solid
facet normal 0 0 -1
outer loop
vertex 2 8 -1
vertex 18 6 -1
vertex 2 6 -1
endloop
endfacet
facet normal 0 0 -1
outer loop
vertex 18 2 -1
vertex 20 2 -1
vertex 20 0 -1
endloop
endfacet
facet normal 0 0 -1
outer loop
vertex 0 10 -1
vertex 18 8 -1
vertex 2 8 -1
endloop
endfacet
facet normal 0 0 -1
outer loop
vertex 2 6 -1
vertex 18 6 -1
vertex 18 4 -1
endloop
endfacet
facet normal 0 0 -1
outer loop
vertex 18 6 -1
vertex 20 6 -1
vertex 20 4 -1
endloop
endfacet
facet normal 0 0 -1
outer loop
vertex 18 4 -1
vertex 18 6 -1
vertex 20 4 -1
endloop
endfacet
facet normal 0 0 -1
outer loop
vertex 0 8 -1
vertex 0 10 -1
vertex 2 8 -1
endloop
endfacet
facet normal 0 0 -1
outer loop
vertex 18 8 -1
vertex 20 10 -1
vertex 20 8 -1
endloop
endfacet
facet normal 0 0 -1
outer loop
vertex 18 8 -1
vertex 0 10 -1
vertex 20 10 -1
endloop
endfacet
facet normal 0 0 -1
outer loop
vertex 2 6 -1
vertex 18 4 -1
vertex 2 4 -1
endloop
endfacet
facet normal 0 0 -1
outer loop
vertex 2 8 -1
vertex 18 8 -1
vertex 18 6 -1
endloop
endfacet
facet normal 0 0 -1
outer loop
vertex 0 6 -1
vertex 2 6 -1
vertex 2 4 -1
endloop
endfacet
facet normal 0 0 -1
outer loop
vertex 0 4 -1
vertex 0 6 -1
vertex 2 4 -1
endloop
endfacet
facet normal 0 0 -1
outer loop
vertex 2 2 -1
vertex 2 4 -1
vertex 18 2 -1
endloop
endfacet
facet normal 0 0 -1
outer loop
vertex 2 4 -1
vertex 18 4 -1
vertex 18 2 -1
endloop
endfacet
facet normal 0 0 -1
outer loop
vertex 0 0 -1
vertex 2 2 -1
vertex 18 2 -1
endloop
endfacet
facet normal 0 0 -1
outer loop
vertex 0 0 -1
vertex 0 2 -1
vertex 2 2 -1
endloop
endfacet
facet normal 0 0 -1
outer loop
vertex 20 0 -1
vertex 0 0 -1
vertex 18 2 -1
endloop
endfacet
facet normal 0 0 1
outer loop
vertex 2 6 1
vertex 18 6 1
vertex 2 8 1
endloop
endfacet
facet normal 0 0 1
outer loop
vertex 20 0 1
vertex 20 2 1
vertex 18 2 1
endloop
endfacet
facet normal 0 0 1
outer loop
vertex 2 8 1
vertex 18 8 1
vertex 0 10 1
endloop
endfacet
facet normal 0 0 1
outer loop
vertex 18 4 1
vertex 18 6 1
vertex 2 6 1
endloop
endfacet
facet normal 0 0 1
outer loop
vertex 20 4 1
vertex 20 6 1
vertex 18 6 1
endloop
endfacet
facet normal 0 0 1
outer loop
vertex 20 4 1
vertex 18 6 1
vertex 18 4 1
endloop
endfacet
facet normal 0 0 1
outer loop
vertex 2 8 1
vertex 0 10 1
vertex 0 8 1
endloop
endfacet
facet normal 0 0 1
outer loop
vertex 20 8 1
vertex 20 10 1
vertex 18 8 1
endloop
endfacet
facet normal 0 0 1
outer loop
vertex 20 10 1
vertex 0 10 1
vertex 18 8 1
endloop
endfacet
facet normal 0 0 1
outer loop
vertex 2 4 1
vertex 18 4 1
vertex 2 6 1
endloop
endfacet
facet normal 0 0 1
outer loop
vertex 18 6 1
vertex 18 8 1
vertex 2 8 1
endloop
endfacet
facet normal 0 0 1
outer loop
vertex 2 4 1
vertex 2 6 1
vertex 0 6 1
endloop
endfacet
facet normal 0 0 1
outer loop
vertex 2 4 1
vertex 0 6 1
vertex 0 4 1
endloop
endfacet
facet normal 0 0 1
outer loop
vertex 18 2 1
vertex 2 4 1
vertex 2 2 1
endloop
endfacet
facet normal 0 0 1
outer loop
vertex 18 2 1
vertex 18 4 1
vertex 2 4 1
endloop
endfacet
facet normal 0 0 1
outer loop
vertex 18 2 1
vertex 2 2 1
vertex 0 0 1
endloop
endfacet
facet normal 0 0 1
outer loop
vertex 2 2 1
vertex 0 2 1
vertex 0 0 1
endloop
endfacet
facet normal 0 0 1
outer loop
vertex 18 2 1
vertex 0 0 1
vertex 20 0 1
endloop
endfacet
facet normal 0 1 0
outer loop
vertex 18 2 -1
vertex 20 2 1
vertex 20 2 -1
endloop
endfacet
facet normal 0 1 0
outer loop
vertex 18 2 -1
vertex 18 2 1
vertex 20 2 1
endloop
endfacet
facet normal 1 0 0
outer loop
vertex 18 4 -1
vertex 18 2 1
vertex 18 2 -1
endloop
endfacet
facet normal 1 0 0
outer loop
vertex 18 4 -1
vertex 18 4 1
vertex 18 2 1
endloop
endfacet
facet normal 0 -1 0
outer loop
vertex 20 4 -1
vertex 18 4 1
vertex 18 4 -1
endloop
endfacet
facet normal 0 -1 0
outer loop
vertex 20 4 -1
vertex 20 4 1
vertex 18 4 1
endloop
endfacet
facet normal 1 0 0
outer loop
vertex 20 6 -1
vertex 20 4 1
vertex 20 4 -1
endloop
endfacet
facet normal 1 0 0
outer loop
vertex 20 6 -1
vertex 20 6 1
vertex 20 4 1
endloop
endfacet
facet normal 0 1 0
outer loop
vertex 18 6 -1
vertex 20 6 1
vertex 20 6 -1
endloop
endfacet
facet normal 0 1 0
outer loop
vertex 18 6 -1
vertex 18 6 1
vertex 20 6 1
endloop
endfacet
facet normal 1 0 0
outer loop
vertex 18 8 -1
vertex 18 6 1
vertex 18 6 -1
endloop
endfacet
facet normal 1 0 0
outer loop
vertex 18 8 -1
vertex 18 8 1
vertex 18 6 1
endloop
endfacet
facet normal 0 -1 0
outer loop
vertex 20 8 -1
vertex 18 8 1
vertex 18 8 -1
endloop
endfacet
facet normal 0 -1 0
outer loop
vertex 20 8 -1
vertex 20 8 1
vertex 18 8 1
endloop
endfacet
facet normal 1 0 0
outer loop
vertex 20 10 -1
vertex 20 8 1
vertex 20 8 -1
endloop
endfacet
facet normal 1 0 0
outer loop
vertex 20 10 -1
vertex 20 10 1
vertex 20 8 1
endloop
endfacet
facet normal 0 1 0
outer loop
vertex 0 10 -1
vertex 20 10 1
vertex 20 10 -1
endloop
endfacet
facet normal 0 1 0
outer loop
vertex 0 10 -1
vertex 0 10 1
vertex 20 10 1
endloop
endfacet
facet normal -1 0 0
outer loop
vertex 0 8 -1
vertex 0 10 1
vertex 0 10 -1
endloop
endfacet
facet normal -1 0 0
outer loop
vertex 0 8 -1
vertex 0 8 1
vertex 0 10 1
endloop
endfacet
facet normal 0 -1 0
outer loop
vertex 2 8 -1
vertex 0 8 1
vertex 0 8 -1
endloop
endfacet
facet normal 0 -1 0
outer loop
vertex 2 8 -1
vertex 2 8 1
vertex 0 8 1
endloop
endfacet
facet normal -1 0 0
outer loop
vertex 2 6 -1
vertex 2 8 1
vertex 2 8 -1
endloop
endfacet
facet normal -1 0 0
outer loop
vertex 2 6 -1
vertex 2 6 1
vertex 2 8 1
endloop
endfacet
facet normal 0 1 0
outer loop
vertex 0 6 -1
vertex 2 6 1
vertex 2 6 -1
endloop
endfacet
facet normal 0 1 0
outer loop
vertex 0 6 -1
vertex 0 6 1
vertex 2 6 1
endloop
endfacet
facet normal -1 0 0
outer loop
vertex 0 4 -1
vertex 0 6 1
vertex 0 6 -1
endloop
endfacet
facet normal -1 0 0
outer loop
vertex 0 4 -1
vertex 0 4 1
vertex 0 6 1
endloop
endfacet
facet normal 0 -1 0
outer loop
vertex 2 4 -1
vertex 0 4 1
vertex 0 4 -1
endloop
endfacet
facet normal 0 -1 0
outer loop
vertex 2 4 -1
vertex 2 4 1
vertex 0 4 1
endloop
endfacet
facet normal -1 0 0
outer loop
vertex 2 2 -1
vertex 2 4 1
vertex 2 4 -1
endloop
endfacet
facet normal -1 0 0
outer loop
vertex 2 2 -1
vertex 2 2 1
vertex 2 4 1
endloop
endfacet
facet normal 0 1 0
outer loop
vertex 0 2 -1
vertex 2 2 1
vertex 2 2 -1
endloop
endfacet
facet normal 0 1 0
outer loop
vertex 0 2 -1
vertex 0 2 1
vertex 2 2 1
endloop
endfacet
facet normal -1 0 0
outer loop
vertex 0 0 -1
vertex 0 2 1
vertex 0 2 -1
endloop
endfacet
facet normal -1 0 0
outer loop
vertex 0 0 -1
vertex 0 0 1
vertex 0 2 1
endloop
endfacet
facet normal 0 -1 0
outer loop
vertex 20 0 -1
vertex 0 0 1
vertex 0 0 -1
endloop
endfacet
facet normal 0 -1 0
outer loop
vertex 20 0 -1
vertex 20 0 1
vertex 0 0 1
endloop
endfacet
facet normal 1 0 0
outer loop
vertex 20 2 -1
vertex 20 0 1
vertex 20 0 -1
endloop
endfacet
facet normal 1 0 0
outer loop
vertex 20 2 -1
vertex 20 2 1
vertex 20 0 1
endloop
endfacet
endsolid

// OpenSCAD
linear_extrude(height = 2, center = true, convexity = 10, twist = 0)
polygon([[0,0],[20,0],[20,2],[18,2],[18,4],[20,4],[20,6],[18,6],[18,8],[20,8],[20,10],[0,10],[0,8],[2,8],[2,6],[0,6],[0,4],[2,4],[2,2],[0,2]],[[0,1,2,3,4,5,6,7,8,9,10,11,12,13,14,15,16,17,18,19]]);


Wood_size = 20; // [10:Small,20:Medium,30:Large]

Wood_length = 10;
Wood_height = 5;

// How many fingers do you want for articulation?
Number_of_fingers = 5; // [2:10]



// How thick should the wood be?
Wood_thickness = 2; // [1:5]
